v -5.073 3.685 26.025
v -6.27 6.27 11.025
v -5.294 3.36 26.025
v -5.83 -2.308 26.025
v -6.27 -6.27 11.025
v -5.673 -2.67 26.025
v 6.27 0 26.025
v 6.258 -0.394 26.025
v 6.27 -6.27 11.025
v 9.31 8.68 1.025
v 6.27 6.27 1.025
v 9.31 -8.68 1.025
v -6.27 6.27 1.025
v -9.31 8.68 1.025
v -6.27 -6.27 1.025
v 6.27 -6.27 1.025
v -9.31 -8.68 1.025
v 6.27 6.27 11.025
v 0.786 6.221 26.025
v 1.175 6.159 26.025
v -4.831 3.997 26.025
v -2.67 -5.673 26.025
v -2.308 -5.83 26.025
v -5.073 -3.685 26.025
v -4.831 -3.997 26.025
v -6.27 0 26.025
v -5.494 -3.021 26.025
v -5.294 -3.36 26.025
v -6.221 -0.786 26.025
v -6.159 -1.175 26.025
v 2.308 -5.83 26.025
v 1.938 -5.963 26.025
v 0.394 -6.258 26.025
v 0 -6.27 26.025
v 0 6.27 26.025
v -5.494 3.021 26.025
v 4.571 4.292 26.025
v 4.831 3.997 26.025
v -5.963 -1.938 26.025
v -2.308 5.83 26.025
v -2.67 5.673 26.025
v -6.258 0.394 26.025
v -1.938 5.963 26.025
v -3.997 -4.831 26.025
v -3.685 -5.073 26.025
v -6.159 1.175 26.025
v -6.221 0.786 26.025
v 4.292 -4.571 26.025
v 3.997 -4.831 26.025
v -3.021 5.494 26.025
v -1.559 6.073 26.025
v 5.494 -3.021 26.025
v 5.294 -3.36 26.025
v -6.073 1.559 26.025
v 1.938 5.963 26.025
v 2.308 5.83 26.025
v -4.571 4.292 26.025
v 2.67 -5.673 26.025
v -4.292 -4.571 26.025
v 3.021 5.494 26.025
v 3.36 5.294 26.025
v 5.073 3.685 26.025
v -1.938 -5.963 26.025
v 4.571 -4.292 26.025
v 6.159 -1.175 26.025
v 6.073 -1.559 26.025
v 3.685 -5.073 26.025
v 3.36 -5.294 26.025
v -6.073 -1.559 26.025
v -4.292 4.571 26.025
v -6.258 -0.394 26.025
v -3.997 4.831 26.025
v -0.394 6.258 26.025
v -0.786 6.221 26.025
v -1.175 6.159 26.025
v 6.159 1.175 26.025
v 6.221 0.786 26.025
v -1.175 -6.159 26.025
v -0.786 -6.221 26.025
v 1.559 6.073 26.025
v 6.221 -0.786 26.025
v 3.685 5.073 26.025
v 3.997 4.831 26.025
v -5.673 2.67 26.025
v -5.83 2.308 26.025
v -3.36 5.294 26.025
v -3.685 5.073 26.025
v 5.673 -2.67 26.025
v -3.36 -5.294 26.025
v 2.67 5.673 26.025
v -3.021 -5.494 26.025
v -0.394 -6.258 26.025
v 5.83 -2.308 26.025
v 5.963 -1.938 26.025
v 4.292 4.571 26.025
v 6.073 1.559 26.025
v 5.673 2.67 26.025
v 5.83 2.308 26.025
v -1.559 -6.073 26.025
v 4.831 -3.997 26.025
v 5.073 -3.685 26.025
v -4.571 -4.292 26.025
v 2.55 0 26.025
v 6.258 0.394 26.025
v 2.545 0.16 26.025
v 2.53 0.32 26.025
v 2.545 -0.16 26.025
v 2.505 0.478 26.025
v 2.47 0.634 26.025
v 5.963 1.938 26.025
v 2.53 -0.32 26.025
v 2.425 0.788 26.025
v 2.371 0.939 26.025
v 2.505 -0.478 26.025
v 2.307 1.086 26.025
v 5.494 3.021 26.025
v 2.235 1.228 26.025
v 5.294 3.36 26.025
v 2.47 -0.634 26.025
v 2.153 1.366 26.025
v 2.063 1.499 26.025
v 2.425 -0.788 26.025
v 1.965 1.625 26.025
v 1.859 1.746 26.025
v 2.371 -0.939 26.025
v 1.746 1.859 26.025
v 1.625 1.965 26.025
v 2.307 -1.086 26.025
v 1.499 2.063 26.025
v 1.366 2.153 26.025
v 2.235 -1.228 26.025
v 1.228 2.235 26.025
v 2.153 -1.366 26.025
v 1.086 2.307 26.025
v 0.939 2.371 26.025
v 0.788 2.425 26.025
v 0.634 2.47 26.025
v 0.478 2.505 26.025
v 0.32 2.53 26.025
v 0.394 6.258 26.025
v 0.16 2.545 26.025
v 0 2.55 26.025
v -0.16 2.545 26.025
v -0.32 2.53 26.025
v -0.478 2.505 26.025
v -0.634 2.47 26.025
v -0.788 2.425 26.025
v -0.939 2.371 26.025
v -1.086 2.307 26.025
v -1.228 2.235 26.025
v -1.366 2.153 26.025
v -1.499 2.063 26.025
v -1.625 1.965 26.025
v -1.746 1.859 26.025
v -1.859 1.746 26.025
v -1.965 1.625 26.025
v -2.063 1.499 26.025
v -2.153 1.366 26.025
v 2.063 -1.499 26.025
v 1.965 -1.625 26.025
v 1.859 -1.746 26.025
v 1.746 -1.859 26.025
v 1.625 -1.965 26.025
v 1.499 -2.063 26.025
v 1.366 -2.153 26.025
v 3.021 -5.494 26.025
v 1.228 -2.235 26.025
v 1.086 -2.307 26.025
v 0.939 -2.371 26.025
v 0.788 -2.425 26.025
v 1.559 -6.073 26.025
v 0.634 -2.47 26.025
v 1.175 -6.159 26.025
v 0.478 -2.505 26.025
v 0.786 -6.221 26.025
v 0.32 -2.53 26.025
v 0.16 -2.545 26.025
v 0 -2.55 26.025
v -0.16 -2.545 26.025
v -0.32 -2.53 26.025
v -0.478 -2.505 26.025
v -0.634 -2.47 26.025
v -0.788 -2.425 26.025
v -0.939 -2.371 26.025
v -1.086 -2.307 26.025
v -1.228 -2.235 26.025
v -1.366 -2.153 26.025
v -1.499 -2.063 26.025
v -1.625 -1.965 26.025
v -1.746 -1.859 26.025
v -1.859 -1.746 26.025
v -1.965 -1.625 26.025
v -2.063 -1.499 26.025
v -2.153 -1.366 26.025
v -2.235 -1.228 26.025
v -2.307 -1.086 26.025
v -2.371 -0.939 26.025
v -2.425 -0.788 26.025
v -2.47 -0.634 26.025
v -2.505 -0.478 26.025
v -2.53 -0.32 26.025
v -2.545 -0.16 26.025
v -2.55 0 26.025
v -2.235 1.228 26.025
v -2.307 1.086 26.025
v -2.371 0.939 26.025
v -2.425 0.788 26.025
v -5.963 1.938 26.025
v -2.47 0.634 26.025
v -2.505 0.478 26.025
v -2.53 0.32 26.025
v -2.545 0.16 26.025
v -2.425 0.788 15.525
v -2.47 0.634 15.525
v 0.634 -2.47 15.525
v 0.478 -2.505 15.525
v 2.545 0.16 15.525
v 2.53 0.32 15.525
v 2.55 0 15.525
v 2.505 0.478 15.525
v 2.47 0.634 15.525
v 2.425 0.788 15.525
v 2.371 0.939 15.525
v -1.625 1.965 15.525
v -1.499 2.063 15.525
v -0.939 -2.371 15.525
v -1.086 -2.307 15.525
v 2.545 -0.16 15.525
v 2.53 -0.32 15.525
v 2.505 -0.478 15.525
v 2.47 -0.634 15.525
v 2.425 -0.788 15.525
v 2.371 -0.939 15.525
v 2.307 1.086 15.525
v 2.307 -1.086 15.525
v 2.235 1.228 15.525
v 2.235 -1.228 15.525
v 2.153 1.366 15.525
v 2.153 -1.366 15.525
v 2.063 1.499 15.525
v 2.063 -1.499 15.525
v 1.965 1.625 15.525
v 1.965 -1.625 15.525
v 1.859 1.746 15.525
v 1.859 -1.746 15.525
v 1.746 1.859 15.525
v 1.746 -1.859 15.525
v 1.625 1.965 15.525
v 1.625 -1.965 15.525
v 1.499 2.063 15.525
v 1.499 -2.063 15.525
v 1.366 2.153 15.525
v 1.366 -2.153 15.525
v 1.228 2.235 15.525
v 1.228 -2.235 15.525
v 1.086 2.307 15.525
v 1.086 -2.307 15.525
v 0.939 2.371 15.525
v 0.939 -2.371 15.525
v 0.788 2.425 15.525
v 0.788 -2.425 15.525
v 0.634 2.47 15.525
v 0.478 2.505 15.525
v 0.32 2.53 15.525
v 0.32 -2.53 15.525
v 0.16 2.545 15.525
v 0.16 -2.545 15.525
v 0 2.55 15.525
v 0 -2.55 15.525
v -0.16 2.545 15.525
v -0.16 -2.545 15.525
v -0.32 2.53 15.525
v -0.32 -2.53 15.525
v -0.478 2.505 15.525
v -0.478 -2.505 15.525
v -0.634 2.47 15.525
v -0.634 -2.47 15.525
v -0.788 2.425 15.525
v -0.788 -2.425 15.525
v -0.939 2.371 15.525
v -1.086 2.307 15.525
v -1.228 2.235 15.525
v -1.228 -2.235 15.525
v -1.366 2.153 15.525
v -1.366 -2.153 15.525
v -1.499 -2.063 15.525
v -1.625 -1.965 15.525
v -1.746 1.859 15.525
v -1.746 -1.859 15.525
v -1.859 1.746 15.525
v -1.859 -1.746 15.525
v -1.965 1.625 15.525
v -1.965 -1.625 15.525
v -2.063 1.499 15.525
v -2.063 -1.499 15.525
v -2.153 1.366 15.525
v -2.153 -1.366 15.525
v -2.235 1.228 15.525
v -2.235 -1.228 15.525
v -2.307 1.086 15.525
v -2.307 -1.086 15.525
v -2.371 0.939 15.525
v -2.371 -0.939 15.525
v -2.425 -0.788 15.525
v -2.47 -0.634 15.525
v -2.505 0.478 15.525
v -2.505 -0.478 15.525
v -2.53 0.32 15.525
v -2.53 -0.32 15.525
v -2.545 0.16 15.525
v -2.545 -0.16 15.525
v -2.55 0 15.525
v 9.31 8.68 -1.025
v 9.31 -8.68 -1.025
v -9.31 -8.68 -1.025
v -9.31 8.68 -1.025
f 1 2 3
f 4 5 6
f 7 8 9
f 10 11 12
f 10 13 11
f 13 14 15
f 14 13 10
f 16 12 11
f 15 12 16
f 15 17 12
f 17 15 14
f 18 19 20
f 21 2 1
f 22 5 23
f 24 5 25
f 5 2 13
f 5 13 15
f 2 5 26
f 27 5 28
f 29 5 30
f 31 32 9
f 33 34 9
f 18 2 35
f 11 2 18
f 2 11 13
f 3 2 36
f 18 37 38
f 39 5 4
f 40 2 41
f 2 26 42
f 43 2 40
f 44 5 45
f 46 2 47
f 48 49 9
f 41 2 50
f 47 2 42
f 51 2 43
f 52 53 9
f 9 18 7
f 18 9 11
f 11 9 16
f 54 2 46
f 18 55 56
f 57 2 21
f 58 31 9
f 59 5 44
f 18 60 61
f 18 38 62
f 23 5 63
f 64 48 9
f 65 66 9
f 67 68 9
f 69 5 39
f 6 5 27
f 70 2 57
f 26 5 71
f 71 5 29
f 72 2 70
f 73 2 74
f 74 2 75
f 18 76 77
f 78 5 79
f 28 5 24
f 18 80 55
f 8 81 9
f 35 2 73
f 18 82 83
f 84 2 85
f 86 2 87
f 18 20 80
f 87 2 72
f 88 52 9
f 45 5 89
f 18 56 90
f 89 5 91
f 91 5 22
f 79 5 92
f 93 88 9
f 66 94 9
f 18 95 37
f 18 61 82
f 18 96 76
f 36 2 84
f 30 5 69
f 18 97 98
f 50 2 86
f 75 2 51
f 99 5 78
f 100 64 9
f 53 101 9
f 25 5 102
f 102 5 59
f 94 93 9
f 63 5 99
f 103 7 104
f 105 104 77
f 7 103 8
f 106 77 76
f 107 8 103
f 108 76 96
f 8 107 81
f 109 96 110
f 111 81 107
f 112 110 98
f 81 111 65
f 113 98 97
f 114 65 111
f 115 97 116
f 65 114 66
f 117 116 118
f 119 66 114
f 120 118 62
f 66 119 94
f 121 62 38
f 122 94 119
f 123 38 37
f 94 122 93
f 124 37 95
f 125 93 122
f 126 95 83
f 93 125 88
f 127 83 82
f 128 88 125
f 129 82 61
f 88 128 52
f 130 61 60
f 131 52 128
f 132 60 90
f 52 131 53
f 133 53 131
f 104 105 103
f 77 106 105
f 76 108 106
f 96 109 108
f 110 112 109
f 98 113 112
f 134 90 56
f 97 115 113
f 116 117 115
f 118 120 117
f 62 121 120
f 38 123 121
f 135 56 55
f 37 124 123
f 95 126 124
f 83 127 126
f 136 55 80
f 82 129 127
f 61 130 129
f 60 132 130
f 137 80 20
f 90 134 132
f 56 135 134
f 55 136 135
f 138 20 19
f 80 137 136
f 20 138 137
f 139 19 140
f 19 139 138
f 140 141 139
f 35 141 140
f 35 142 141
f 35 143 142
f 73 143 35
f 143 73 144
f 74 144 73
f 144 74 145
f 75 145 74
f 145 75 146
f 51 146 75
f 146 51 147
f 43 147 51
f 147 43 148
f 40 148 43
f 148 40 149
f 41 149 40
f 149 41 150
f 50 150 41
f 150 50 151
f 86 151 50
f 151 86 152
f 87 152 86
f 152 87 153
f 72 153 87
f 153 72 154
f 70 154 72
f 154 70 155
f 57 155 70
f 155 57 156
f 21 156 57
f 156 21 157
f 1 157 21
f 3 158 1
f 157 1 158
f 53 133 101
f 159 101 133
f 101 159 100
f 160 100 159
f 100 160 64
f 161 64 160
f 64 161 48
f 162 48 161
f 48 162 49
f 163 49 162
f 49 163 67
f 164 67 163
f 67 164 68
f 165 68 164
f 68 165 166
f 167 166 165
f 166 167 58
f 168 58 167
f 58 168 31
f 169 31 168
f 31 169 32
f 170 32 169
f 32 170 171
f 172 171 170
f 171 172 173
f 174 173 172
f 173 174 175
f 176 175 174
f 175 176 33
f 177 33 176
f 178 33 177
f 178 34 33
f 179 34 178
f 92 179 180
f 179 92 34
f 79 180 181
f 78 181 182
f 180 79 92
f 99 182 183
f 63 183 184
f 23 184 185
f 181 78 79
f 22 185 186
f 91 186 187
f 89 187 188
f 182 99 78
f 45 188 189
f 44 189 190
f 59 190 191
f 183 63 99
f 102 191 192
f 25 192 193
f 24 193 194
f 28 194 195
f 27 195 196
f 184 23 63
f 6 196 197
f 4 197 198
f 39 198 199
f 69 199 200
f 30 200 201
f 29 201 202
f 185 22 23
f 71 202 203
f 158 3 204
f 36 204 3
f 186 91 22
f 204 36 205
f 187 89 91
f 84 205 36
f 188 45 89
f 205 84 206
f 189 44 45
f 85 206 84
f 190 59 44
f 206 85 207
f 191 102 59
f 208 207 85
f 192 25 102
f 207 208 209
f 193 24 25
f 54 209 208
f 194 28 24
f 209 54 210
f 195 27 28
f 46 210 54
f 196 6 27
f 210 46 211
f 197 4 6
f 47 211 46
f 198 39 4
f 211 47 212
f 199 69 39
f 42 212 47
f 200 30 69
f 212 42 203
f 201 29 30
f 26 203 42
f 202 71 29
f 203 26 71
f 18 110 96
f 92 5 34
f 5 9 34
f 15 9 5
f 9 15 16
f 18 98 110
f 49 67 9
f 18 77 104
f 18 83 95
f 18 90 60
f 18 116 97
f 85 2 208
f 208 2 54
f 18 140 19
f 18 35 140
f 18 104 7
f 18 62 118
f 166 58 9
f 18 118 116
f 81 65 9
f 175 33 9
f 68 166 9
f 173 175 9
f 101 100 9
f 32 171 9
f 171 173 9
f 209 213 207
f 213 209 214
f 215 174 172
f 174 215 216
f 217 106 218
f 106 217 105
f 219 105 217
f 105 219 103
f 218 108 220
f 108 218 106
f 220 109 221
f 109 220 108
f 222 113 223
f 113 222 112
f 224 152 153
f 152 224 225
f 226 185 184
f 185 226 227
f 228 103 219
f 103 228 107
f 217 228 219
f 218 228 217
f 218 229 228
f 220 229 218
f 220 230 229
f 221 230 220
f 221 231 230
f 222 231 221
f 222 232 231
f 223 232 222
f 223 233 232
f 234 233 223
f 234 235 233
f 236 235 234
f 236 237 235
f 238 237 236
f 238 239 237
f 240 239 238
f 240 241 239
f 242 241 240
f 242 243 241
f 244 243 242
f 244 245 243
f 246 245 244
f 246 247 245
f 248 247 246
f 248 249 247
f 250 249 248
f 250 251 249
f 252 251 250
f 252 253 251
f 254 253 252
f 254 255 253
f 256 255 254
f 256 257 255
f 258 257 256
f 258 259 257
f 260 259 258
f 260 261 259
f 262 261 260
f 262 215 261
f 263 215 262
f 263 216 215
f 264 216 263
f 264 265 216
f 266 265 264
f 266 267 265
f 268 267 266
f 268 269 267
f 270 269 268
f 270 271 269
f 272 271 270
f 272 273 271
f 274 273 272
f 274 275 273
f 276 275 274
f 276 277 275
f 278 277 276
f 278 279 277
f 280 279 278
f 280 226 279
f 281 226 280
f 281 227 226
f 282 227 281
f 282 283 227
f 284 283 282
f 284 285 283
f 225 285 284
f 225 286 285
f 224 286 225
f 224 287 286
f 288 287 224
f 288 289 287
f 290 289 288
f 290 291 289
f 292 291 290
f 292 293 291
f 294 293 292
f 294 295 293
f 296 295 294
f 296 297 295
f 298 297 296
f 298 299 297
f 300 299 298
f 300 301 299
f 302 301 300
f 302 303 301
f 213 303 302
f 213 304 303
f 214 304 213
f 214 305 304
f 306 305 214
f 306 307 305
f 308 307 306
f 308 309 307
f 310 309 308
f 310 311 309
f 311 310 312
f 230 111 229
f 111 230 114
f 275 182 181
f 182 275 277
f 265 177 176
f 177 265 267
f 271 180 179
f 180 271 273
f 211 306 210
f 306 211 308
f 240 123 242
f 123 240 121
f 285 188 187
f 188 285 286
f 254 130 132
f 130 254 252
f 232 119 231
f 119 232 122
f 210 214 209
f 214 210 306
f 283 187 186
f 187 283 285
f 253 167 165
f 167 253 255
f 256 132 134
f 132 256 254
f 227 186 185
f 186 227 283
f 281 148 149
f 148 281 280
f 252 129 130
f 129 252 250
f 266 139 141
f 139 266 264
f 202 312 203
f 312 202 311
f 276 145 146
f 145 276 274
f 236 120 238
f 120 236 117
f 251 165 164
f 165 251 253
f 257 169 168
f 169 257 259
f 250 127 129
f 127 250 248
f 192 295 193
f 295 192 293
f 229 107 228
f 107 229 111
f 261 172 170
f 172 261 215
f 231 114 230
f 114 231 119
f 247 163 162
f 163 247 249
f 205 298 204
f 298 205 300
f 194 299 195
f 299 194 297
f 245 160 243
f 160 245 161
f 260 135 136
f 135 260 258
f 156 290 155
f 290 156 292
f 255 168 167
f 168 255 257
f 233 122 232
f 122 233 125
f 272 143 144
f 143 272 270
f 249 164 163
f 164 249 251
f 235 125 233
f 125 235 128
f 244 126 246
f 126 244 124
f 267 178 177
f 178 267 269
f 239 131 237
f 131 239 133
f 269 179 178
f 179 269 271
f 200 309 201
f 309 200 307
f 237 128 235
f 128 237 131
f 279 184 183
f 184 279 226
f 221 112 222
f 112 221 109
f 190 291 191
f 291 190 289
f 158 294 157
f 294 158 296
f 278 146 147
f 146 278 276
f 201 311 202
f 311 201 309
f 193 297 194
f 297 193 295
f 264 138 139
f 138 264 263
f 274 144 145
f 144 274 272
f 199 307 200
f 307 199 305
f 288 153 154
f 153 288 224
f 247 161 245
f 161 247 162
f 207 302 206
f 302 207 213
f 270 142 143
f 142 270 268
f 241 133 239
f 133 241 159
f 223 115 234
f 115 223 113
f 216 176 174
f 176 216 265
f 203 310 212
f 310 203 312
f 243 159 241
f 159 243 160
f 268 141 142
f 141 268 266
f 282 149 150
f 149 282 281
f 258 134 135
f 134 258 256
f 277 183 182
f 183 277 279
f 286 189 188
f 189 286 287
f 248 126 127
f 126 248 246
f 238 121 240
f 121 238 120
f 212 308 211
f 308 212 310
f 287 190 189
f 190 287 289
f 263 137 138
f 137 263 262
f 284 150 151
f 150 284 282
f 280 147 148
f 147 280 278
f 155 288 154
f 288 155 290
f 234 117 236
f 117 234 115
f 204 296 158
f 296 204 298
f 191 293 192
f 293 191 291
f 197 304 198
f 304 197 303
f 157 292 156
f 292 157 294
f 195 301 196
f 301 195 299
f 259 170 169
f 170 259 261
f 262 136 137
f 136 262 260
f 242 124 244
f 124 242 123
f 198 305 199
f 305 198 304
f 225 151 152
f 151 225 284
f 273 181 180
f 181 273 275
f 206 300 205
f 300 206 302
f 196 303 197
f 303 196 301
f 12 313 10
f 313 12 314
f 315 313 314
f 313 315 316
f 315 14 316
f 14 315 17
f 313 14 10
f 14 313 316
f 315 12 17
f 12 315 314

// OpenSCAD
$fn=100;
cube(size=[18.62, 17.36, 2.05], center=true);
difference() {
  hull() {
    translate([0,0,2.05/2 + 5]) cube(size=[12.54, 12.54, 10], center=true);
    translate([0,0,2.05/2 + 20]) cylinder(r=12.54/2, h=10, center=true);
  }

  translate([0,0,2.05/2 + 20]) cylinder(r=5.1/2, h=11, center=true);
}
